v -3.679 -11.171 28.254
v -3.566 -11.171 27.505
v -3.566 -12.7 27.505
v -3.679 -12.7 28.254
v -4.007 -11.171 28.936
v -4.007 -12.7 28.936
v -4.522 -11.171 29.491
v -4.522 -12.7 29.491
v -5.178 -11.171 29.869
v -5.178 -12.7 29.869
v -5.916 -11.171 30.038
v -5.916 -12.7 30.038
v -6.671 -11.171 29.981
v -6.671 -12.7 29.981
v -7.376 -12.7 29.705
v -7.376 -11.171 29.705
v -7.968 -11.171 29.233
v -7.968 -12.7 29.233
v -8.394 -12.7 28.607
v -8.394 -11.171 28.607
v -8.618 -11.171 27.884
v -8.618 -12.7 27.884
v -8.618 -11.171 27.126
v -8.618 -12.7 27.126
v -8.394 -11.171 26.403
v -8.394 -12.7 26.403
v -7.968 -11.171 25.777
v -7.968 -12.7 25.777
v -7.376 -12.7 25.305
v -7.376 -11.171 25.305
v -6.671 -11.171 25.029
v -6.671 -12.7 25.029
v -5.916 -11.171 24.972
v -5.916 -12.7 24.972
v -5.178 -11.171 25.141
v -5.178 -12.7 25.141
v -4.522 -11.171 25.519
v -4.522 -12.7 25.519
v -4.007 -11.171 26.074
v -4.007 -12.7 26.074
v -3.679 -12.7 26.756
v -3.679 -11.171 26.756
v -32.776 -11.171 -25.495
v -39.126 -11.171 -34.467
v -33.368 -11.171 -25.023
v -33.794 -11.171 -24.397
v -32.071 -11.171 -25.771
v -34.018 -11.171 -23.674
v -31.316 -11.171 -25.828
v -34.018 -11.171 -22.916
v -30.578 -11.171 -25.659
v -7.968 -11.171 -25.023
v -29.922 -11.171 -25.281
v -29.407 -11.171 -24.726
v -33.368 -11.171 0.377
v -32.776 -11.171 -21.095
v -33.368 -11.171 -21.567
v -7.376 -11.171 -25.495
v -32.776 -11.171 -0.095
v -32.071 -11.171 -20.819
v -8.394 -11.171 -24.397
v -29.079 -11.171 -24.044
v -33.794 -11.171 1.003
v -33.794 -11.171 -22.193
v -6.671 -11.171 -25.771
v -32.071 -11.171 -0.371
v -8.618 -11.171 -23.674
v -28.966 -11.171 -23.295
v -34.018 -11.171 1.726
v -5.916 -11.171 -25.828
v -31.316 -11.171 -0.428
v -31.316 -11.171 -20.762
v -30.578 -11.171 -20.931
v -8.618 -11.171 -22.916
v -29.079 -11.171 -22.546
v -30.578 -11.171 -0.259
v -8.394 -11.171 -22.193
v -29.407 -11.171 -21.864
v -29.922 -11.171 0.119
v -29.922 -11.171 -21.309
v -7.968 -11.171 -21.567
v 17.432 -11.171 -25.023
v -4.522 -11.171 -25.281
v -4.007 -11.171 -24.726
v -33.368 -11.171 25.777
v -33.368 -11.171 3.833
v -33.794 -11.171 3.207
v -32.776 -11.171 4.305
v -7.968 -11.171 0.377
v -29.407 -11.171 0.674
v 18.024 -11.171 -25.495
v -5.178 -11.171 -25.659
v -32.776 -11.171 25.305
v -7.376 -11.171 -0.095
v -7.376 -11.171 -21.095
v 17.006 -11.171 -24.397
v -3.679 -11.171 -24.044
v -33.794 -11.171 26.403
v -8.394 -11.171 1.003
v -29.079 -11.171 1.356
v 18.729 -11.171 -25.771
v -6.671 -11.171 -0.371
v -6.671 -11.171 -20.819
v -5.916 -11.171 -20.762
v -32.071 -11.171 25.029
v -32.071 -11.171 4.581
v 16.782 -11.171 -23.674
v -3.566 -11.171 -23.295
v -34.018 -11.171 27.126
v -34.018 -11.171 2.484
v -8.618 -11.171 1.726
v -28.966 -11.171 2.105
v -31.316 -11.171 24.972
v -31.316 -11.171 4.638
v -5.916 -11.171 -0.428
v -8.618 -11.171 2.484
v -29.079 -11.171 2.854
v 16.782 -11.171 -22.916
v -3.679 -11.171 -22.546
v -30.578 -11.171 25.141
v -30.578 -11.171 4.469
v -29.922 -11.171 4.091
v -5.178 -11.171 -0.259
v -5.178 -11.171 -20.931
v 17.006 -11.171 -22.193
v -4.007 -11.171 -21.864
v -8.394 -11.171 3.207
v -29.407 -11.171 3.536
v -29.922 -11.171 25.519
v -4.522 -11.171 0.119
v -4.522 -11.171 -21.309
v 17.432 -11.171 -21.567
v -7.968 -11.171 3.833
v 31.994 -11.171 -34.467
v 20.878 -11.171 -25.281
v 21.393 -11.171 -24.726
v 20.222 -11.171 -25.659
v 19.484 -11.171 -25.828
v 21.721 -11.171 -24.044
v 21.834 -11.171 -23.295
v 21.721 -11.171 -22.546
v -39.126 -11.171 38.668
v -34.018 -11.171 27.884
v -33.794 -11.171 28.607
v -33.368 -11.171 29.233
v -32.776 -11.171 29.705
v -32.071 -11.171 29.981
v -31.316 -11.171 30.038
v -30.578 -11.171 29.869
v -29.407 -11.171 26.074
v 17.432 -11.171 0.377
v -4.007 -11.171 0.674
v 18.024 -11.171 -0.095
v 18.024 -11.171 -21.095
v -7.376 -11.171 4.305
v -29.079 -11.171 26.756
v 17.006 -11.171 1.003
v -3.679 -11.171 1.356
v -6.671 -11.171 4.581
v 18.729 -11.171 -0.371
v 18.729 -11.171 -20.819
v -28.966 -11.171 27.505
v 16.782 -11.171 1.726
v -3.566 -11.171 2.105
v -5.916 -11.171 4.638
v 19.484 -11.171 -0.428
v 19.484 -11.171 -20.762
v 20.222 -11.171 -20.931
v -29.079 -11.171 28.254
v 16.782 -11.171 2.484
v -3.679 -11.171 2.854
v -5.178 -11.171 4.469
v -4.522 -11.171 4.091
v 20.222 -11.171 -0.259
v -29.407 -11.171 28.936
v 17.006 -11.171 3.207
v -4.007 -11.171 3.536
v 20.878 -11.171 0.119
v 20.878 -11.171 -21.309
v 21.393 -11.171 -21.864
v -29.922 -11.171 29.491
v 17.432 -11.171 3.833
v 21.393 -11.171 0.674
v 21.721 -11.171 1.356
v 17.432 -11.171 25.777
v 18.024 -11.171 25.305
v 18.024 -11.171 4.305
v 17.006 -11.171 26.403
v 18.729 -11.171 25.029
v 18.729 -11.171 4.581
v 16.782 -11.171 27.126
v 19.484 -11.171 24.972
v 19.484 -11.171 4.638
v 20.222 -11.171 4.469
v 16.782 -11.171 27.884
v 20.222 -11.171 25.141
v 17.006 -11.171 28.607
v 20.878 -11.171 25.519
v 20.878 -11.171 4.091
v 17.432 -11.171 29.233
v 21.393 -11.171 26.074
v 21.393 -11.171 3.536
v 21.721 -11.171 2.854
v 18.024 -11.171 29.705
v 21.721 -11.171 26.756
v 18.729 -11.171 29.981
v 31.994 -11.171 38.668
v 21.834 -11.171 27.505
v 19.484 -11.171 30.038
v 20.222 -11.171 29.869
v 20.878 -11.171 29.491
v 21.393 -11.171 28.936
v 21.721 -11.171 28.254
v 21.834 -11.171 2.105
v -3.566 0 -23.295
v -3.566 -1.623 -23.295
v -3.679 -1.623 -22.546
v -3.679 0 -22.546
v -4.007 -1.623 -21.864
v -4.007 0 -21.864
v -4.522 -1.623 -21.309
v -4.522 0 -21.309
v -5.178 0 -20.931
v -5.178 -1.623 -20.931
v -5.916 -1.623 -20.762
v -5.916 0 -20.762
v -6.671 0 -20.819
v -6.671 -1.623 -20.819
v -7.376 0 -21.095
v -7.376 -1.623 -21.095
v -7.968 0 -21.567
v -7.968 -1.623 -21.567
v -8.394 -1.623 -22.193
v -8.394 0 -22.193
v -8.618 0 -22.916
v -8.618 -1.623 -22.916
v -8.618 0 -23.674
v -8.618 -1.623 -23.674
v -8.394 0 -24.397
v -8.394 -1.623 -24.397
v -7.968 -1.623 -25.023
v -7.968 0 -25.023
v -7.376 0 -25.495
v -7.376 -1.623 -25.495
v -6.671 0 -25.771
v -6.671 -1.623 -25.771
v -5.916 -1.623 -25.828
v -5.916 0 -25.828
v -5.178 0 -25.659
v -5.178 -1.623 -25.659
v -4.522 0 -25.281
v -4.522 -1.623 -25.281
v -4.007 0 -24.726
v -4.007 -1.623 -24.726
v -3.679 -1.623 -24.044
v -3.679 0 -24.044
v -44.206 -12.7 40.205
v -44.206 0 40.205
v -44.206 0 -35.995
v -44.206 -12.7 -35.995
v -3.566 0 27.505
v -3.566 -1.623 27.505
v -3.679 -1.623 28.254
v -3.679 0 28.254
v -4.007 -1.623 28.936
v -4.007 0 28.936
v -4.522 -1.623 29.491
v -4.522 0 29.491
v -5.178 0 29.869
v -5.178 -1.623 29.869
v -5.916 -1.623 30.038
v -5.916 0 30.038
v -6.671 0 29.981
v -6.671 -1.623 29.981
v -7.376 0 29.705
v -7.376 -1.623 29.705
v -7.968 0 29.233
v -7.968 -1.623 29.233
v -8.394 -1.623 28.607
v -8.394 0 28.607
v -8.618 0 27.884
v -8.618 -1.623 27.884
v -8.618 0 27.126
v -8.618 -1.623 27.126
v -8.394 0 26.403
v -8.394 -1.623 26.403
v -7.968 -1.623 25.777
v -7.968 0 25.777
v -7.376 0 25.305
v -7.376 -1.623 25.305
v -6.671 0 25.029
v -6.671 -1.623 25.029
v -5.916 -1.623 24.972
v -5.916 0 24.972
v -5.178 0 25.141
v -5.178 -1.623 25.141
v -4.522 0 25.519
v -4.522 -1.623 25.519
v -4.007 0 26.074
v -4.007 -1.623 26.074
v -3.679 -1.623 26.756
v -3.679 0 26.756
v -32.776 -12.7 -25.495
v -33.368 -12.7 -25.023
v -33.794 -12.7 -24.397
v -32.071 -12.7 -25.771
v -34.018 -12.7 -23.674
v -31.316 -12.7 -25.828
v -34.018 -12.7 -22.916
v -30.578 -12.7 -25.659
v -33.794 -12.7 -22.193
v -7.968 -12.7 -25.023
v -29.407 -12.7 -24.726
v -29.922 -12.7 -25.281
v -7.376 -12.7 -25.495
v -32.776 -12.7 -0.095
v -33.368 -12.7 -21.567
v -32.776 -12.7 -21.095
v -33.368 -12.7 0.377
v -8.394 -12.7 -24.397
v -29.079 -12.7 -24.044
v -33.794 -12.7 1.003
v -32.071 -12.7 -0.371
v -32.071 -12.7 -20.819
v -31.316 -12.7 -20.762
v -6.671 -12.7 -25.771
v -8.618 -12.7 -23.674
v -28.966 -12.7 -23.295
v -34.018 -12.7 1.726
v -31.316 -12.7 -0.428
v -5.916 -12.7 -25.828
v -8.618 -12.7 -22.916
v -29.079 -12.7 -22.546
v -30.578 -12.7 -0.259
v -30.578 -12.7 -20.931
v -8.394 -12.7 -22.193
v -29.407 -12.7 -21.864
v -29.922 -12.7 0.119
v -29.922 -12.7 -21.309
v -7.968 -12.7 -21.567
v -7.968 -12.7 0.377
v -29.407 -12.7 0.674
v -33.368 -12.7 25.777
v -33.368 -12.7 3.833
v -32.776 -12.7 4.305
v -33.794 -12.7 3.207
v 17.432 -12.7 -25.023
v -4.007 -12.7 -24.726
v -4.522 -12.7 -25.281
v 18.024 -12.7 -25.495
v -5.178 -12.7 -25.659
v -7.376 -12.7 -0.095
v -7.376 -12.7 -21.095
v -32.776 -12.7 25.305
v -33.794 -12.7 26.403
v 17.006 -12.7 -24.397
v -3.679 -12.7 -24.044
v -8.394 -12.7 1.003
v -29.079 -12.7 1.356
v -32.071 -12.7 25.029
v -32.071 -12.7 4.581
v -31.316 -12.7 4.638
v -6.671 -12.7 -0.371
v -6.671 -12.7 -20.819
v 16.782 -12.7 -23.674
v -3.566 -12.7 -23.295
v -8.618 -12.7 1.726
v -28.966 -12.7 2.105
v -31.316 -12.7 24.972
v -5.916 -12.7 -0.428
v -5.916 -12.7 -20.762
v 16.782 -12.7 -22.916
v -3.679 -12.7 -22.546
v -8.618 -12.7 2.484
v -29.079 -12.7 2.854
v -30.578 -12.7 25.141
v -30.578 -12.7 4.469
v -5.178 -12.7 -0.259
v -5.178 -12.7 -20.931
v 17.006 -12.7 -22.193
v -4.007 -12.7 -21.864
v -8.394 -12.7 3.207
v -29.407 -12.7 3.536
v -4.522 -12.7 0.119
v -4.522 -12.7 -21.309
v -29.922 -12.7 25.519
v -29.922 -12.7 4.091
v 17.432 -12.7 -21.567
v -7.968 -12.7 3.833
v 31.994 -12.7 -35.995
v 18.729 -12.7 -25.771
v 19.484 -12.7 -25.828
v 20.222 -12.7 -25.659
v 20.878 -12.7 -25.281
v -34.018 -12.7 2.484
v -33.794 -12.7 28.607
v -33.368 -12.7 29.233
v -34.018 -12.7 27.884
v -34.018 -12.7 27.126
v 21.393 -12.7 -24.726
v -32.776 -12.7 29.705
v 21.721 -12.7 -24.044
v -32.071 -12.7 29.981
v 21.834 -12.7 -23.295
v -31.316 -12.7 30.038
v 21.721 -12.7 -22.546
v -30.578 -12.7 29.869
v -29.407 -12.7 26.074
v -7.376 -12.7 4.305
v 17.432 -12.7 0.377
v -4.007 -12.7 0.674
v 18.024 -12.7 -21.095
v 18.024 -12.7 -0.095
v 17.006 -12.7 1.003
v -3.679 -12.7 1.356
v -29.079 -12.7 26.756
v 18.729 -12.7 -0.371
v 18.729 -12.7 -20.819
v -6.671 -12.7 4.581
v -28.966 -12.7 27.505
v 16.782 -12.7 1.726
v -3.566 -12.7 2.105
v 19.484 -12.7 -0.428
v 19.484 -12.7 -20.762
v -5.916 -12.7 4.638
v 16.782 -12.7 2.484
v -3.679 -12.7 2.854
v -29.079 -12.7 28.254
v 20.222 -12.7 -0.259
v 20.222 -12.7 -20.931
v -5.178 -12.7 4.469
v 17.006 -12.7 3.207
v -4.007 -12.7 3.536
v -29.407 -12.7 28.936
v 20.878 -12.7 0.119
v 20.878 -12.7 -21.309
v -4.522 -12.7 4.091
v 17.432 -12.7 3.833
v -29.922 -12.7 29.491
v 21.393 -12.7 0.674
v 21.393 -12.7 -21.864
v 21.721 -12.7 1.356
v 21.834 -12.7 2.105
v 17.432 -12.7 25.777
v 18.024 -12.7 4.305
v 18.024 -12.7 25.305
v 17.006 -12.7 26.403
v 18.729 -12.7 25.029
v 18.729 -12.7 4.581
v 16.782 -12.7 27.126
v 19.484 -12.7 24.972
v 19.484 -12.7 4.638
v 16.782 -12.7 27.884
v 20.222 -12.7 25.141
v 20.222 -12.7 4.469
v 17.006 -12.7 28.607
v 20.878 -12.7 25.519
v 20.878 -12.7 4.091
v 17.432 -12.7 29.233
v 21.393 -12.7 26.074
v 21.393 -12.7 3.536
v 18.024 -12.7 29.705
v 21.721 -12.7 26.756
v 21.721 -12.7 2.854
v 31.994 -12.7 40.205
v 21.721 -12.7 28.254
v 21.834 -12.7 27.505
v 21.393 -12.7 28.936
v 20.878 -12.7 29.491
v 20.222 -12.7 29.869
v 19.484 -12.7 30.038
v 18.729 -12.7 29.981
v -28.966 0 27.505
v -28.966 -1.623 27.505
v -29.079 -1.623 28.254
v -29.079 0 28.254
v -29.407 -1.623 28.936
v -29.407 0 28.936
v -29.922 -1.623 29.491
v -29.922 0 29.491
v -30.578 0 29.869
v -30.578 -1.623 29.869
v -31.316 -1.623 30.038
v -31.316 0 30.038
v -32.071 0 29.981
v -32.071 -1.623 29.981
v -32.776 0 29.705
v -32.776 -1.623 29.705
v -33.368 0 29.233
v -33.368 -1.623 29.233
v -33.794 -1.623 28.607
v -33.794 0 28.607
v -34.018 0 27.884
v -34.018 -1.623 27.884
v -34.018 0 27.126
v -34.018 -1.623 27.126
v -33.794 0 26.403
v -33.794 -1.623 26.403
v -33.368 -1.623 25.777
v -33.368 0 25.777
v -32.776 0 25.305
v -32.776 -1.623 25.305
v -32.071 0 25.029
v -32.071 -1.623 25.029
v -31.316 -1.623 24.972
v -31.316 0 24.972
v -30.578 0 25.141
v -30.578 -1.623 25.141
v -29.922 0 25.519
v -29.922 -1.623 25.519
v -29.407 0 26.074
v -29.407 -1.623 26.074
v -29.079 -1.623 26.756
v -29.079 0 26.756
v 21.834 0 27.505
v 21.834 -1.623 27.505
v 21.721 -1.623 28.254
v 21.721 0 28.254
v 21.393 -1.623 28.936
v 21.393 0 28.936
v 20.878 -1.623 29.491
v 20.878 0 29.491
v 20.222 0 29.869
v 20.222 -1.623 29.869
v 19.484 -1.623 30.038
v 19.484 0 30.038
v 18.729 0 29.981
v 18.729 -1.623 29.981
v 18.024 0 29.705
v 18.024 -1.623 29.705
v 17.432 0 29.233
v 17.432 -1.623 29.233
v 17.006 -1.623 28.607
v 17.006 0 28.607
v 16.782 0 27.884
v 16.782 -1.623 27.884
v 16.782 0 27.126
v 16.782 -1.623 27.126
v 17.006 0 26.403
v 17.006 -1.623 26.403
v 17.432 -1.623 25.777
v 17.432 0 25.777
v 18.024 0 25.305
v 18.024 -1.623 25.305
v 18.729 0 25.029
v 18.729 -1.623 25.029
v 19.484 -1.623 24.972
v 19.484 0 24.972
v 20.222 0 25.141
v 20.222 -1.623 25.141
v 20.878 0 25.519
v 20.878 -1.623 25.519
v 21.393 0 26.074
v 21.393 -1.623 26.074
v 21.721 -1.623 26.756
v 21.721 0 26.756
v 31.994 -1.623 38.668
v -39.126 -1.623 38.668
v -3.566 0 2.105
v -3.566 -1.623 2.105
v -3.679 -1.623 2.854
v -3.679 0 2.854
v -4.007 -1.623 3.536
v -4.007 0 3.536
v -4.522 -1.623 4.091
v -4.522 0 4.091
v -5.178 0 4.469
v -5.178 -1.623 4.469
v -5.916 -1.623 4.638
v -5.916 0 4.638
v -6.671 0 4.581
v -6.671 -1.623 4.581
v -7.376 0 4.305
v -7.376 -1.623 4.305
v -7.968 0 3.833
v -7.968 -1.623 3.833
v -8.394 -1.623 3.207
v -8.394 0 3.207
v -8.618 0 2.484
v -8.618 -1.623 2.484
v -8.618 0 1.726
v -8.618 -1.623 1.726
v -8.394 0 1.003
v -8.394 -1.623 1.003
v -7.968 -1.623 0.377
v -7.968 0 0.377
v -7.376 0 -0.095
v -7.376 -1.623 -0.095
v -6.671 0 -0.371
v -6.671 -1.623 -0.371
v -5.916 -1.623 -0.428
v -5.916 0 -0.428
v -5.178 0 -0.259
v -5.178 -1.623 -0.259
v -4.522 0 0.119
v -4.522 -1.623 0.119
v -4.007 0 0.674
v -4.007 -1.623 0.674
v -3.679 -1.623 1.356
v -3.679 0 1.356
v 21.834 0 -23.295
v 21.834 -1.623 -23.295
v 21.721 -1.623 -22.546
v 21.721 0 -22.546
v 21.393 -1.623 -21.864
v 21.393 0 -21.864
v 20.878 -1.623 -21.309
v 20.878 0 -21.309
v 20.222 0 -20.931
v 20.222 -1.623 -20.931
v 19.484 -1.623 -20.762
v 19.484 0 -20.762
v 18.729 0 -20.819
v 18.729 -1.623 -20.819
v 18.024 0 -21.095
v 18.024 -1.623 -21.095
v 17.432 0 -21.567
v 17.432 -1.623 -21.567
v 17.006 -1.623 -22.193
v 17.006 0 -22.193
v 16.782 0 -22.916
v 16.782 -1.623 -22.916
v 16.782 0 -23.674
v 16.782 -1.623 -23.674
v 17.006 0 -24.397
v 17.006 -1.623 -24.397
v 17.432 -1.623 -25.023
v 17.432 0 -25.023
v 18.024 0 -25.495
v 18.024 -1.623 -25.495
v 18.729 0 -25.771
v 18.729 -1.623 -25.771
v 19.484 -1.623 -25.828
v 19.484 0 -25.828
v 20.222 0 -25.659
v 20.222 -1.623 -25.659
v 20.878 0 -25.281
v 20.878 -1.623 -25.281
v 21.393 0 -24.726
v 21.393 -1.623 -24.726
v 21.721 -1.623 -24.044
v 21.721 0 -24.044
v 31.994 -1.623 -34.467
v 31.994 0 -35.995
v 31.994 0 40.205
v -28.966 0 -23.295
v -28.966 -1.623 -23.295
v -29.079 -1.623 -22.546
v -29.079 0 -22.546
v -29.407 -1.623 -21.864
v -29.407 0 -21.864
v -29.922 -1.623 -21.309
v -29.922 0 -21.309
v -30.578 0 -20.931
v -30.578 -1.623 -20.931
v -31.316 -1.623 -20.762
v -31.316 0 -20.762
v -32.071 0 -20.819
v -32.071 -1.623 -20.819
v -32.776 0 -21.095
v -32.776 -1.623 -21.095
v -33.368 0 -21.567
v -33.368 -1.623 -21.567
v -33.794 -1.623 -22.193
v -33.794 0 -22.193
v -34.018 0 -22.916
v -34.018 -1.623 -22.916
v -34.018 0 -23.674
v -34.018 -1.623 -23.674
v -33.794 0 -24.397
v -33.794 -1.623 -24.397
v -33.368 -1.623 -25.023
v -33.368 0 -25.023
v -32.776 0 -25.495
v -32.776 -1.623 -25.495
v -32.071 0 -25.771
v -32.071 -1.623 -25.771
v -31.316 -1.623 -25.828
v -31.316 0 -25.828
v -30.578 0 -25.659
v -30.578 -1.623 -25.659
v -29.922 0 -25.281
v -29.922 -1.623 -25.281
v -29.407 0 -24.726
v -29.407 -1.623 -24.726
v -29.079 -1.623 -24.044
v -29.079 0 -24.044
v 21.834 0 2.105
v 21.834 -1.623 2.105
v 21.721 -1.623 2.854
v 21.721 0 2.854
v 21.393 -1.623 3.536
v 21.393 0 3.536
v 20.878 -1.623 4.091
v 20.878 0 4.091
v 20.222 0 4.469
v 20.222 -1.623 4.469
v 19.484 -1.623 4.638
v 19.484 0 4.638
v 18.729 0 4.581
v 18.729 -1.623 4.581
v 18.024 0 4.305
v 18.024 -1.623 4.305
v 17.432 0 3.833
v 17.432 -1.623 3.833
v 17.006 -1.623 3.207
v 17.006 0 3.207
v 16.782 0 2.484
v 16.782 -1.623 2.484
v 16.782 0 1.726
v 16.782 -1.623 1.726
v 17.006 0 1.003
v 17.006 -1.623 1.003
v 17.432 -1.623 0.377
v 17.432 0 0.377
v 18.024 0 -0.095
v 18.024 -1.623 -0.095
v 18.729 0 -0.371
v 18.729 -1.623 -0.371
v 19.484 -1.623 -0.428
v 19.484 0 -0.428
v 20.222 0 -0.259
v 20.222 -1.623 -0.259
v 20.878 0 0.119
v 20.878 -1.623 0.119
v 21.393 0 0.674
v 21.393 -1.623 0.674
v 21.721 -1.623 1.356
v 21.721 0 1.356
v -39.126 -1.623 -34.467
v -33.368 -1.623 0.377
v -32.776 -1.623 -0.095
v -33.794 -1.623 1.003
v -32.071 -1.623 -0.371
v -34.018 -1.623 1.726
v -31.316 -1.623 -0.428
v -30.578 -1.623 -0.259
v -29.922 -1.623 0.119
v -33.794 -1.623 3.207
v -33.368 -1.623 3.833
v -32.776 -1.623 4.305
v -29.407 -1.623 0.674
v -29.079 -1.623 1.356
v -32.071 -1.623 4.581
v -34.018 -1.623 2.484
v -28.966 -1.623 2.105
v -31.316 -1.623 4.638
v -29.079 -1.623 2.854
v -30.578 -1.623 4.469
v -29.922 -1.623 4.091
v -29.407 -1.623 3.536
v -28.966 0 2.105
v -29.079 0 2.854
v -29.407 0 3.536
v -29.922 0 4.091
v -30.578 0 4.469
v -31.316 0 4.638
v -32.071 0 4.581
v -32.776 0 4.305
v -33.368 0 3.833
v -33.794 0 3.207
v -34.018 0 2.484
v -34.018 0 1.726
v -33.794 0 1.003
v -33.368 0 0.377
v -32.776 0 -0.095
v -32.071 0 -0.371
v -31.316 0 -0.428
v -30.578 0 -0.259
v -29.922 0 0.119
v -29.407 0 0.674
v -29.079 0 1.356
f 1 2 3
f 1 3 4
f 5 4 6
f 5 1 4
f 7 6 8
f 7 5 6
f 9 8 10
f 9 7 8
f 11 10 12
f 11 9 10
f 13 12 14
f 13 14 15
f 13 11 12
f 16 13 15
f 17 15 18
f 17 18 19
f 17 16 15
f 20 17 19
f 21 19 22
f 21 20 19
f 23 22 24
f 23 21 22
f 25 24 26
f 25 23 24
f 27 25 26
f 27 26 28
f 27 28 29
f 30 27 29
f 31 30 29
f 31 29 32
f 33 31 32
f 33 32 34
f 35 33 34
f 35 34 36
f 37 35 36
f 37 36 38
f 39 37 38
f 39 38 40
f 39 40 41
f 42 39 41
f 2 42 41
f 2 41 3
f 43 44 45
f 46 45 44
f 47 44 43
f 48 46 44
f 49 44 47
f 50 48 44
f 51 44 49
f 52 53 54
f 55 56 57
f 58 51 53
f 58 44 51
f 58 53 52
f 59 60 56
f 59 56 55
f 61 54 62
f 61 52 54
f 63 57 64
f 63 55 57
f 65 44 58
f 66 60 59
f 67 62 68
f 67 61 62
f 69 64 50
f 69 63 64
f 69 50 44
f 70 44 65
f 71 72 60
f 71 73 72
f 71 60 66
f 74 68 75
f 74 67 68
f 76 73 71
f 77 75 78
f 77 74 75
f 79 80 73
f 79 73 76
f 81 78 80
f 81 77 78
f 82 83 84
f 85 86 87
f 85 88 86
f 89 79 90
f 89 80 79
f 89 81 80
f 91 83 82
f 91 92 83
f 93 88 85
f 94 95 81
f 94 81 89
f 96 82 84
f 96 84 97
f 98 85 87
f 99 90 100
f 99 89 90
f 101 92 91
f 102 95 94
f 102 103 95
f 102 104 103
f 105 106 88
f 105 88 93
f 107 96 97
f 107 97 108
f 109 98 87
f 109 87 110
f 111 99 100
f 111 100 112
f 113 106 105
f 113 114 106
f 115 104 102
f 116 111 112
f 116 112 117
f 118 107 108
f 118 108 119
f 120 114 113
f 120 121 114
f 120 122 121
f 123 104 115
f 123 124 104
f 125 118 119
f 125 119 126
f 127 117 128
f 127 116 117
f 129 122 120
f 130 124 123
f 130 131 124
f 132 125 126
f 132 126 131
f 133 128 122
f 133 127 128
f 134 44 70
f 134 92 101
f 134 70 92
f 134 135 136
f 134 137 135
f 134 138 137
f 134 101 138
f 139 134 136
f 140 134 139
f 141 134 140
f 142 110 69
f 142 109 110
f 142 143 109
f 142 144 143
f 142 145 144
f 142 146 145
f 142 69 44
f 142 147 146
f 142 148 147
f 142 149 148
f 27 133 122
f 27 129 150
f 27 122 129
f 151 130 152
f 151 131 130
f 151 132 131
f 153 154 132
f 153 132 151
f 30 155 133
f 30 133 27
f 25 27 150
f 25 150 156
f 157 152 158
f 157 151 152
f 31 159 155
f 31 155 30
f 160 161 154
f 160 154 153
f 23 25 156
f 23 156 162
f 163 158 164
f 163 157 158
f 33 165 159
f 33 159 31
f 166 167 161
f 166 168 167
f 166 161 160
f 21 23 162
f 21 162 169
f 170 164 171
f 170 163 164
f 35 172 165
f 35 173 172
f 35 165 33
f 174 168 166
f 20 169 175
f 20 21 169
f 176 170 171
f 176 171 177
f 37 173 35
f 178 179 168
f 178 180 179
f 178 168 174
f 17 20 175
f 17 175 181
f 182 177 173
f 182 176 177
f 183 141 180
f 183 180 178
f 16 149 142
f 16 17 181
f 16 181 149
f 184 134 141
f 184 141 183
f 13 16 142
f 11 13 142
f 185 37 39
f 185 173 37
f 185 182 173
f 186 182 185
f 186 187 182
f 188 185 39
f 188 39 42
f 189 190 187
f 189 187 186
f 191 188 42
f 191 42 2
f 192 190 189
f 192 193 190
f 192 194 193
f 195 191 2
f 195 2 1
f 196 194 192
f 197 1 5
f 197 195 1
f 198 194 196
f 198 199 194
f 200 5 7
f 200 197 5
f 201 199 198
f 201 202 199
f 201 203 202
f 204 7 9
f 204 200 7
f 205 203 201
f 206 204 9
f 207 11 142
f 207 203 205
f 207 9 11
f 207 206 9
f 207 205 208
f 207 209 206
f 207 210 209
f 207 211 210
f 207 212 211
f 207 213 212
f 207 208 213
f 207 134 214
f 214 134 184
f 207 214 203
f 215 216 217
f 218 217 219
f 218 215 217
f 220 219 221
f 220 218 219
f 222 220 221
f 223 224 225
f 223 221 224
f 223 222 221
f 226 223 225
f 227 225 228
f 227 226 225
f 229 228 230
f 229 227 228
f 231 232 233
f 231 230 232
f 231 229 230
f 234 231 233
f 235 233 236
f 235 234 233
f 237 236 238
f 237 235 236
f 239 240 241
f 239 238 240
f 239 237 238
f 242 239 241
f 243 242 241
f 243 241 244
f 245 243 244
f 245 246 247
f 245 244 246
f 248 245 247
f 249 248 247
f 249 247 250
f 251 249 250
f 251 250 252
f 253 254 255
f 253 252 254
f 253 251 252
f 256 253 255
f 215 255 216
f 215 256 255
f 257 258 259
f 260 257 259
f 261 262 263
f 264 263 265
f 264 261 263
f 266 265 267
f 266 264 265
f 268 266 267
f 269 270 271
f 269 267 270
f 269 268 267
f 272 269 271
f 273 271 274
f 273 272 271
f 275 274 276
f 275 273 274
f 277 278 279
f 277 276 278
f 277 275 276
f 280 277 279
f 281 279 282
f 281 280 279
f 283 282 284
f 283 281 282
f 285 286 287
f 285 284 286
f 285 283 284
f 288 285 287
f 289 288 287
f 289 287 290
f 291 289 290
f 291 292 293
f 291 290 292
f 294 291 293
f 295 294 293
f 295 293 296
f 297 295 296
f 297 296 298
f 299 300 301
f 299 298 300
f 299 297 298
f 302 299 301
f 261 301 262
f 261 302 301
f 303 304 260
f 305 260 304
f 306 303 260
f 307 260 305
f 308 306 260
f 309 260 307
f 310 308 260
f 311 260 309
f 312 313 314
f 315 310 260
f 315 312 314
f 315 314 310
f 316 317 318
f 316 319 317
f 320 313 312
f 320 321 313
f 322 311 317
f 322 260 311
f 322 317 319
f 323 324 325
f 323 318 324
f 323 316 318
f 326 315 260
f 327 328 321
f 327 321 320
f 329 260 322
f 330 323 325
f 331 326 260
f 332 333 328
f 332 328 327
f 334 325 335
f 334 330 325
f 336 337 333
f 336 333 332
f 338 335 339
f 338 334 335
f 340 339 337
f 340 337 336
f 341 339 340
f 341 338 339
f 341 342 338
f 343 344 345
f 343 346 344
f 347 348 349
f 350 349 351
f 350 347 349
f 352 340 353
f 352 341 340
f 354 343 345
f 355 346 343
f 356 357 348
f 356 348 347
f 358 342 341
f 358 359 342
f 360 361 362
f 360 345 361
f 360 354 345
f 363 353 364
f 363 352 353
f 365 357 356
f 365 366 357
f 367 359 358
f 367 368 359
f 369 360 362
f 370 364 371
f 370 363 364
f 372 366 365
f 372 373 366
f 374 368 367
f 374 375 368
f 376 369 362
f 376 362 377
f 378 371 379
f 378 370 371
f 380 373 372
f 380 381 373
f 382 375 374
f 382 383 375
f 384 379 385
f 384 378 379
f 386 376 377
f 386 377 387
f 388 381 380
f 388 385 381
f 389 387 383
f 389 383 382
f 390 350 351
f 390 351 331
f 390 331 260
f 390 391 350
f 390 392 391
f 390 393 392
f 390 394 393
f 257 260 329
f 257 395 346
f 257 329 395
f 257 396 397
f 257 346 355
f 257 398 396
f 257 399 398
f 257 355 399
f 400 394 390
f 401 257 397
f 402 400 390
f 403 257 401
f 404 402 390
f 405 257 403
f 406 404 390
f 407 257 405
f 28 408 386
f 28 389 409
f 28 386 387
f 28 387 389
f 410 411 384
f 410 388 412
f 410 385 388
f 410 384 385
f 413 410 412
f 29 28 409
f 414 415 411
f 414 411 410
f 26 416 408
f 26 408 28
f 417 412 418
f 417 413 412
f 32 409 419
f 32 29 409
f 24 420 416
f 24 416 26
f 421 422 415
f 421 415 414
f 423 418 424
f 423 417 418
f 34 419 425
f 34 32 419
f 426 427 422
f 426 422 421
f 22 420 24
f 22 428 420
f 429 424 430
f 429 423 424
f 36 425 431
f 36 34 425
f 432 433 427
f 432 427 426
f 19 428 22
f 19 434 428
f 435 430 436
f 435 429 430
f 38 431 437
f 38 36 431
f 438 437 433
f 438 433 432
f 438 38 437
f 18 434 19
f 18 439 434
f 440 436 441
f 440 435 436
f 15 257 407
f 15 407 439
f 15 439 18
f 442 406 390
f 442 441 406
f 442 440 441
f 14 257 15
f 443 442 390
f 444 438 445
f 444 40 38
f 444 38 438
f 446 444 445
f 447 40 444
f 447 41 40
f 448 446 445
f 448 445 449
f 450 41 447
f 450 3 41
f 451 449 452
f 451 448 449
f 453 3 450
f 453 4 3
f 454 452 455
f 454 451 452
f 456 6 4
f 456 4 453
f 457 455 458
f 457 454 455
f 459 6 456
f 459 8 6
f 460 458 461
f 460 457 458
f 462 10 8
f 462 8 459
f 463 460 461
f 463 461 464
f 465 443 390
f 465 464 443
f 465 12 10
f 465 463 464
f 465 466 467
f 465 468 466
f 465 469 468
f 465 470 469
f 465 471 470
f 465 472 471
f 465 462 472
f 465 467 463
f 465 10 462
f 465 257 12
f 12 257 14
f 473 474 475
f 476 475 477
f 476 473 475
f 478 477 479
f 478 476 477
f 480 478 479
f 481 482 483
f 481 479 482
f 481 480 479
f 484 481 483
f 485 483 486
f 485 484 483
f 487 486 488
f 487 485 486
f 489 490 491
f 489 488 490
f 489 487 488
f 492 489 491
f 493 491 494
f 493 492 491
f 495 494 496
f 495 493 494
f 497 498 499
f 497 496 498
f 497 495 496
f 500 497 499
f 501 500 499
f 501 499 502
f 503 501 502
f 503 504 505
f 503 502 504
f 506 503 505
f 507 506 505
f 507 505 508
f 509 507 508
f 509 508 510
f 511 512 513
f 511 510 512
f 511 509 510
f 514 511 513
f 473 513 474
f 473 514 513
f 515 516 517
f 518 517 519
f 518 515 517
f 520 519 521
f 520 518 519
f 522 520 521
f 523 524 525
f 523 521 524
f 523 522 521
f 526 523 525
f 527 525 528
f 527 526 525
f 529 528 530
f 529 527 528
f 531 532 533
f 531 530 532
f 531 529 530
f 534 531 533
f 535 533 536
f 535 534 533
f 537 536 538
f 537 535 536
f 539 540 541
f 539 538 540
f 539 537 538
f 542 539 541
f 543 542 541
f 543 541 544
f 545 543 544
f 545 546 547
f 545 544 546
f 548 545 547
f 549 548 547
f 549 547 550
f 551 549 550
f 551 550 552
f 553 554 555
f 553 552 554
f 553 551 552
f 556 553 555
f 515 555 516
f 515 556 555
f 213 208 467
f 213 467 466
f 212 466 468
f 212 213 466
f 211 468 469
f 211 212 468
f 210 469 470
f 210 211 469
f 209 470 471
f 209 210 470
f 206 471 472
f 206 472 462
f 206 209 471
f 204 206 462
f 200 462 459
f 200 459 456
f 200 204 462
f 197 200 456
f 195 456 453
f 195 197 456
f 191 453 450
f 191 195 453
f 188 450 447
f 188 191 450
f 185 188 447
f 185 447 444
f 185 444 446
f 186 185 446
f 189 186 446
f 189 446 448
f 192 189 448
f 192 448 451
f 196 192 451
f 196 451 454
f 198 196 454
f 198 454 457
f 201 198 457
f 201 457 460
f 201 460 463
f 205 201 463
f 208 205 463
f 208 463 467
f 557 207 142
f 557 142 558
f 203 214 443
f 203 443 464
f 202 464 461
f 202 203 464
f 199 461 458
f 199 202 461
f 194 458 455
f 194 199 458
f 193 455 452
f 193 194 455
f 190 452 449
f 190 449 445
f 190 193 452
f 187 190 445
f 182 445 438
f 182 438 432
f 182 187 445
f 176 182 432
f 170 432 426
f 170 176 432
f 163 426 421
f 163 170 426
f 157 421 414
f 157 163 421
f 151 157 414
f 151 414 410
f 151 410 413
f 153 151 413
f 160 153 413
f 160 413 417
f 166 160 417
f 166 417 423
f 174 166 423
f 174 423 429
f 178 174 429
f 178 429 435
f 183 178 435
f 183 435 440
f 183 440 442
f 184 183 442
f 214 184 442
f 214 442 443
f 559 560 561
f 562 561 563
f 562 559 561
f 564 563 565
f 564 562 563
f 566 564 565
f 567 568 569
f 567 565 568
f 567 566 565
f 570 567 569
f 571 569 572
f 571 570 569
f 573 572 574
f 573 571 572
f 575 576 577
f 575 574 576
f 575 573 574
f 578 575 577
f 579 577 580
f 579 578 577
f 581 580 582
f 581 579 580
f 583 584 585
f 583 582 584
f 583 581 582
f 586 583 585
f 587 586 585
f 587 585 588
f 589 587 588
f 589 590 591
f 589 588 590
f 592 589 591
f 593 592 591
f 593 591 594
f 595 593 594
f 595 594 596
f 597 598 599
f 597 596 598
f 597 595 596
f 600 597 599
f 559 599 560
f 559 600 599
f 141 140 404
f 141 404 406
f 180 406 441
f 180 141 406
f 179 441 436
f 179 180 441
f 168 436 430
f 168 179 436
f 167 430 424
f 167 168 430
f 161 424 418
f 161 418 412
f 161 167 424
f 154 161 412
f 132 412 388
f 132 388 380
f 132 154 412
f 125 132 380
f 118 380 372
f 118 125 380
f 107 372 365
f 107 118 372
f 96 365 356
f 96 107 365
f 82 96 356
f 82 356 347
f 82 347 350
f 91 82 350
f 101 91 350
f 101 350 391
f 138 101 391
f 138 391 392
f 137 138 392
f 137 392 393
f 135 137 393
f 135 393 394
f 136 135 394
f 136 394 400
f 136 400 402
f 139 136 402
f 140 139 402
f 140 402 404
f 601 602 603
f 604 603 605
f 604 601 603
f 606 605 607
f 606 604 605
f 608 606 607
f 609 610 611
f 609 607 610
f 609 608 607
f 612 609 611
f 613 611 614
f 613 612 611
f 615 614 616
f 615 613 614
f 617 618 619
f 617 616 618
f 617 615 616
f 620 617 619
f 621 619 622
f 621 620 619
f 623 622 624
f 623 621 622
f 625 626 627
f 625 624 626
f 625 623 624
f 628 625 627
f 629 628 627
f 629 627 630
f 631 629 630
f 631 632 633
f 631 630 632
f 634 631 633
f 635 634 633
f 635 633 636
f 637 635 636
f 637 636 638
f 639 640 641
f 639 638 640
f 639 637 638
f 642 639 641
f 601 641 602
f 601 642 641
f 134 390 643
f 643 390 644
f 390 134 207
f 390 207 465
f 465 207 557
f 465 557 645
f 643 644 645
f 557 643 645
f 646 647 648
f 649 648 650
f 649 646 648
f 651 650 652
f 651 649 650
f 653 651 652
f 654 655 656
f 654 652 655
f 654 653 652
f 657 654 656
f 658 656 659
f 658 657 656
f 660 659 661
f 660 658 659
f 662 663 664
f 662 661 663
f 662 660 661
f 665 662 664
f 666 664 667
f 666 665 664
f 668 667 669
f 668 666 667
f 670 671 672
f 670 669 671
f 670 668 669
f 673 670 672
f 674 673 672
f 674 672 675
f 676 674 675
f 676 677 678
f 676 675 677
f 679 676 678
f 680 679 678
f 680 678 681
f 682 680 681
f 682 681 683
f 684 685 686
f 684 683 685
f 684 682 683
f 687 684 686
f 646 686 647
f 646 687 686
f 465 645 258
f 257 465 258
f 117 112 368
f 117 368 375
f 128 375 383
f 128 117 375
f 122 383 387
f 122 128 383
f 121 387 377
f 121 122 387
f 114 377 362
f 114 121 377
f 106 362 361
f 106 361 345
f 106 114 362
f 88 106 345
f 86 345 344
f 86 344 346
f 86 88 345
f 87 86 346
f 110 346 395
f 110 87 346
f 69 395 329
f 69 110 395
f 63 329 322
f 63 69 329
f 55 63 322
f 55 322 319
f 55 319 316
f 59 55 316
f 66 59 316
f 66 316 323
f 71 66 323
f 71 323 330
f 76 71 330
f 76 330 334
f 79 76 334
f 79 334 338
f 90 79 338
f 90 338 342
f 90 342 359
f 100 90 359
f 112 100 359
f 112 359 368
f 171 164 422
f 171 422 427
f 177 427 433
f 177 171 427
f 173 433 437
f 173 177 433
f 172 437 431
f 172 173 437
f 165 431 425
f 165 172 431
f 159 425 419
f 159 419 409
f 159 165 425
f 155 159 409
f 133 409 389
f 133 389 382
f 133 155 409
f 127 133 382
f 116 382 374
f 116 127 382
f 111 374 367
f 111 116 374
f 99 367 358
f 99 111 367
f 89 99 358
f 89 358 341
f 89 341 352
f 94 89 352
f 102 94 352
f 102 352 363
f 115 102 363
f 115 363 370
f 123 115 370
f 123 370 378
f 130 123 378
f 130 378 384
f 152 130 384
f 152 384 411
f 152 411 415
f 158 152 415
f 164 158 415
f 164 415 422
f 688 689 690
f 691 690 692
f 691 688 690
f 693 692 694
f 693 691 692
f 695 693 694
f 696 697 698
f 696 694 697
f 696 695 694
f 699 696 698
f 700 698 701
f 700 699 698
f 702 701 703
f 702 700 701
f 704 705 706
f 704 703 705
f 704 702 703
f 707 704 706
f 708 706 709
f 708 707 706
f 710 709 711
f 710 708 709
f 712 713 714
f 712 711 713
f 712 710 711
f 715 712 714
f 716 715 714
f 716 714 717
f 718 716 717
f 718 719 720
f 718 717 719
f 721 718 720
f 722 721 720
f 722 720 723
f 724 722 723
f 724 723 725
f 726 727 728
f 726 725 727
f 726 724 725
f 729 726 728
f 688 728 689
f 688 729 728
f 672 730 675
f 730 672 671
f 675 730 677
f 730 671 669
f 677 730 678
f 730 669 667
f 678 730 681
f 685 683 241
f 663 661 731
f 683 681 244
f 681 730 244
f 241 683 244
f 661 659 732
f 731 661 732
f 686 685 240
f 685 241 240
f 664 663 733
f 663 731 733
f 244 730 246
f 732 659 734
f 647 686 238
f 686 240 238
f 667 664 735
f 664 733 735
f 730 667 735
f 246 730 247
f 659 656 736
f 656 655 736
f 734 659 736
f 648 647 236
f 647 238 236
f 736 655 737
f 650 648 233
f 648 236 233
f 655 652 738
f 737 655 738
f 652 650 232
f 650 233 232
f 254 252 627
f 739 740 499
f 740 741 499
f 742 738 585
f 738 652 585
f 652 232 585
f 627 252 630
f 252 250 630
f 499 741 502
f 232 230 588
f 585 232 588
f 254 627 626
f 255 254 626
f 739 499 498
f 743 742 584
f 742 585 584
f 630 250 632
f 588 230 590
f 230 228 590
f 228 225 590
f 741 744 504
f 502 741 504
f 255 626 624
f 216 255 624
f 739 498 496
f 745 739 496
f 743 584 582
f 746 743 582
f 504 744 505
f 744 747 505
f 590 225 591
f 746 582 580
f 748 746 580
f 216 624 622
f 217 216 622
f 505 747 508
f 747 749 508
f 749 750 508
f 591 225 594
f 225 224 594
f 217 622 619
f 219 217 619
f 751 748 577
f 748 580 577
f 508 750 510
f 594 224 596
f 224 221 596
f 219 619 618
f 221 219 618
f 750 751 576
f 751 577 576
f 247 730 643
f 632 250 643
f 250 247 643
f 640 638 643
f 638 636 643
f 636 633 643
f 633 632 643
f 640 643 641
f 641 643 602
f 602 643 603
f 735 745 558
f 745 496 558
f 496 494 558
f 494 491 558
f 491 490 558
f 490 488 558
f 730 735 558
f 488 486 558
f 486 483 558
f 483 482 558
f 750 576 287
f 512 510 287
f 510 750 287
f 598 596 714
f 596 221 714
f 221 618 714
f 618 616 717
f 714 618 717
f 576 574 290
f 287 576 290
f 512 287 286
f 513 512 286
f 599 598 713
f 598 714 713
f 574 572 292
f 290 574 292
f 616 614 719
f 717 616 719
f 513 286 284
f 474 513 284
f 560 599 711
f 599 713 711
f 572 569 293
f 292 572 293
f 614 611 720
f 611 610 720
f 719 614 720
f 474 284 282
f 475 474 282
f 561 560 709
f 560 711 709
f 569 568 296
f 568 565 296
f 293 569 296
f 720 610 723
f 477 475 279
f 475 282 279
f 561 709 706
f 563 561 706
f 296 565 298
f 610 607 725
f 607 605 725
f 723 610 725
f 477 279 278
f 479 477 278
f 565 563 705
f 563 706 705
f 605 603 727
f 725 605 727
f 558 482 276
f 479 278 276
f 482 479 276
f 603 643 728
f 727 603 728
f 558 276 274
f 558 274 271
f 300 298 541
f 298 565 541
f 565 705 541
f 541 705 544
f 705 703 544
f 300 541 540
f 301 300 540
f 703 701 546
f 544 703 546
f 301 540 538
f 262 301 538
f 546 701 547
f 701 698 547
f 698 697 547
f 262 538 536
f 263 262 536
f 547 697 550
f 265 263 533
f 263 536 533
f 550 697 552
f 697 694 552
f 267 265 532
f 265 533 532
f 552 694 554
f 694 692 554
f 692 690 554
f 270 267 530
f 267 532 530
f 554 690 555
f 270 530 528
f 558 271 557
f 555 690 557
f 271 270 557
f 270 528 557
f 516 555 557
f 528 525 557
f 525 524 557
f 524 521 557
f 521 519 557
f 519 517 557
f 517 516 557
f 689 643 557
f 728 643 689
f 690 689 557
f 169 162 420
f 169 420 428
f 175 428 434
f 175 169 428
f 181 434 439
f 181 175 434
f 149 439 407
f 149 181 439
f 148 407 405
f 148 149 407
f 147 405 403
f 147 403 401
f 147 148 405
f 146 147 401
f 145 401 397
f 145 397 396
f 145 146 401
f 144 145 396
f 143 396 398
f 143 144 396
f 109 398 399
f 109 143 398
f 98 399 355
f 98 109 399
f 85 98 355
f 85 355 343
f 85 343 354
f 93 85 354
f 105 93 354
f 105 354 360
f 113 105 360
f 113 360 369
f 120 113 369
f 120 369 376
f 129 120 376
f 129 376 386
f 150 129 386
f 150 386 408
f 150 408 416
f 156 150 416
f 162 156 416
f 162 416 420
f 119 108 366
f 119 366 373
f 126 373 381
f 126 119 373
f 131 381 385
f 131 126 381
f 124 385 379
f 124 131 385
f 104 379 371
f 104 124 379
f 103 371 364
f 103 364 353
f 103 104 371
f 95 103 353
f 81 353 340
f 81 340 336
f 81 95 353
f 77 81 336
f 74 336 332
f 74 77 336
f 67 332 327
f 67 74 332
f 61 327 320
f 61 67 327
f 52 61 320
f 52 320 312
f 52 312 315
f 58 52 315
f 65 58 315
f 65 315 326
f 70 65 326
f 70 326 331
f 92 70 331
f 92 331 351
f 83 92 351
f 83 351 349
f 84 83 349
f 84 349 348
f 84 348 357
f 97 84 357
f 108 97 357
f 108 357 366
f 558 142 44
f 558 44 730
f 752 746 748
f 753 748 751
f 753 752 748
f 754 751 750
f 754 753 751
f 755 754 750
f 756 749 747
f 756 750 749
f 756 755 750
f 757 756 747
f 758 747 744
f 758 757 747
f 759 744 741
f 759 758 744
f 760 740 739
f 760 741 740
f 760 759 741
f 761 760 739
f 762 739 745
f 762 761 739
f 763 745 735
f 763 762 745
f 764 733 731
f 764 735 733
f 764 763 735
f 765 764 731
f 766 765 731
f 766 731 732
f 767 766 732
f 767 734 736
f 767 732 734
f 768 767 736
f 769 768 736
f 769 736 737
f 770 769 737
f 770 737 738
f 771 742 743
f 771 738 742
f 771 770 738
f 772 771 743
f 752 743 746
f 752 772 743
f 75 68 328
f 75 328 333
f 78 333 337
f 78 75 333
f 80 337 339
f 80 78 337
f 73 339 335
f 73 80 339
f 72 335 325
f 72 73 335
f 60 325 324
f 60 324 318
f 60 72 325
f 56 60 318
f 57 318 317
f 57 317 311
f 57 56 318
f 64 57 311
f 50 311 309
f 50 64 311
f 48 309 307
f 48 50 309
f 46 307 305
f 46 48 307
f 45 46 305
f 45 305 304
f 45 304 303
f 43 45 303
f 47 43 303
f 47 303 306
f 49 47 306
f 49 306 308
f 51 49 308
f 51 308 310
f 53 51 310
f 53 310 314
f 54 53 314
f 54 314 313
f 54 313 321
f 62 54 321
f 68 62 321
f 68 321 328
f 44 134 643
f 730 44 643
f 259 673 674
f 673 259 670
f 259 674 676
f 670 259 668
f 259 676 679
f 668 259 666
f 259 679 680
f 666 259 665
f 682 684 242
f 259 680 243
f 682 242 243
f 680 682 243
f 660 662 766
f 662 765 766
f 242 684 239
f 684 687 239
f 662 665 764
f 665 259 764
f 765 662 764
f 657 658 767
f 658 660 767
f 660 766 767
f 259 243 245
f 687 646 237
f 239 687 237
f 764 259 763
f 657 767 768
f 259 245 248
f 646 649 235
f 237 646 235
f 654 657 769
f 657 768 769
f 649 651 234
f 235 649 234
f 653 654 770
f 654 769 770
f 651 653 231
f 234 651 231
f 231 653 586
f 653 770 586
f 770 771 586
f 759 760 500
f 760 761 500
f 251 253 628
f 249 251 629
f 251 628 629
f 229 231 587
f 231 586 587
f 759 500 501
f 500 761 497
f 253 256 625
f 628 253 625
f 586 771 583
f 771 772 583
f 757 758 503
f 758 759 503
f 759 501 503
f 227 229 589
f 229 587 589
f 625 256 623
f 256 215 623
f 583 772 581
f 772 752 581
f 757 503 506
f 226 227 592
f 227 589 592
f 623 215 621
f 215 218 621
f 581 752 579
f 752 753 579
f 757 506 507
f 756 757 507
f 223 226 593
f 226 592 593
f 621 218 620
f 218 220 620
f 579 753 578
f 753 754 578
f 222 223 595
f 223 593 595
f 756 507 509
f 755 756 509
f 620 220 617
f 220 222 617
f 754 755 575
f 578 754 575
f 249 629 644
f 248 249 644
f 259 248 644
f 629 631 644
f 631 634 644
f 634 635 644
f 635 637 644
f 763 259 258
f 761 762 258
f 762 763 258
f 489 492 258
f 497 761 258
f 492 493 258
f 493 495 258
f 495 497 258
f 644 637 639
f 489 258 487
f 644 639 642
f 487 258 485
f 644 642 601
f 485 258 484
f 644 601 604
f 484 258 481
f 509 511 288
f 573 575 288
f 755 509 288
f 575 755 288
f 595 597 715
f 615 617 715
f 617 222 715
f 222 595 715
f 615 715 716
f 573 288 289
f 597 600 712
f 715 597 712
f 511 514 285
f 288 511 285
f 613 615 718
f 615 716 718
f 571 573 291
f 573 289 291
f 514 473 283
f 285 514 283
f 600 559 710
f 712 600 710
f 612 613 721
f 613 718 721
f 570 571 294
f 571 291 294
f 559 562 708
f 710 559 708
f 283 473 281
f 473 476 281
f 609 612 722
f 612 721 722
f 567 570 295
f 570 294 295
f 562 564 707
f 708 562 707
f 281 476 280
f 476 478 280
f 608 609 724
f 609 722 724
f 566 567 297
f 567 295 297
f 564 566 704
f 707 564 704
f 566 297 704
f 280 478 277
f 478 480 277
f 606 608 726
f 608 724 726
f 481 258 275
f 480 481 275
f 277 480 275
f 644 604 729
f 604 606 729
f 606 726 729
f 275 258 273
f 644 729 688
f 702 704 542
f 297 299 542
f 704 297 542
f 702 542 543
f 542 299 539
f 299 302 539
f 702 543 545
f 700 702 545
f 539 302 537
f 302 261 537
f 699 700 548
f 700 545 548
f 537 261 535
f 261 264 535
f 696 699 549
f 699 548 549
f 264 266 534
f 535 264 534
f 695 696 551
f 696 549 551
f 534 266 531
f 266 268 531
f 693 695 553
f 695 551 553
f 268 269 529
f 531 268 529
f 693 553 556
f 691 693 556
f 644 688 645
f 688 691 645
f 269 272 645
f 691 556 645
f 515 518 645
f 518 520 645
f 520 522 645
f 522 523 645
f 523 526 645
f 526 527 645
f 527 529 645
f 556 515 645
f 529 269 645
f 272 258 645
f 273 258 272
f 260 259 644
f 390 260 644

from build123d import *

# Parameters (mm, degrees)
F0_R     = 2.54
F0_W     = 25.4
F0_H     = 25.4
F1_DEPTH = 12.7
F2_W     = 9.547732
F2_H     = 73.135637
F3_DEPTH = 71.12


with BuildPart() as f1:
    # F0 (on Front) → F1 (new body)
    with BuildSketch(Plane.XZ):
        Polygon((-18.806005, 40.205049), (-44.206005, 40.205049), (-44.206005, 14.805049), (-40.768821, 14.805049), (-18.806005, 14.805049), align=None)
        with Locations((-31.506005, 27.505049)):
            Circle(F0_R, mode=Mode.SUBTRACT)
        Polygon((-40.768821, 14.805049), (-44.206005, 14.805049), (-44.206005, -10.594951), (-18.806005, -10.594951), (-18.806005, 14.805049), align=None)
        with Locations((-31.506005, 2.105049)):
            Circle(F0_R, mode=Mode.SUBTRACT)
        with Locations((-6.106005, 27.505049)):
            Rectangle(F0_W, F0_H)
        with Locations((-6.106005, 27.505049)):
            Circle(F0_R, mode=Mode.SUBTRACT)
        with Locations((-31.506005, -23.294951)):
            Rectangle(F0_W, F0_H)
        with Locations((-31.506005, -23.294951)):
            Circle(F0_R, mode=Mode.SUBTRACT)
        with Locations((19.293995, 27.505049)):
            Rectangle(F0_W, F0_H)
        with Locations((19.293995, 27.505049)):
            Circle(F0_R, mode=Mode.SUBTRACT)
        with Locations((-6.106005, -23.294951)):
            Rectangle(F0_W, F0_H)
        with Locations((-6.106005, -23.294951)):
            Circle(F0_R, mode=Mode.SUBTRACT)
        with Locations((19.293995, 2.105049)):
            Rectangle(F0_W, F0_H)
        with Locations((19.293995, 2.105049)):
            Circle(F0_R, mode=Mode.SUBTRACT)
        with Locations((19.293995, -23.294951)):
            Rectangle(F0_W, F0_H)
        with Locations((19.293995, -23.294951)):
            Circle(F0_R, mode=Mode.SUBTRACT)
        with Locations((-6.106005, 2.105049)):
            Rectangle(F0_W, F0_H)
        with Locations((-6.106005, 2.105049)):
            Circle(F0_R, mode=Mode.SUBTRACT)
    extrude(amount=F1_DEPTH)

    # F2 (on face) → F3 (cut)
    with BuildSketch(Plane.YZ.offset(31.993995)):
        with Locations((-6.396981, 2.100502)):
            Rectangle(F2_W, F2_H)
    extrude(amount=-F3_DEPTH, mode=Mode.SUBTRACT)


solid = f1.part
